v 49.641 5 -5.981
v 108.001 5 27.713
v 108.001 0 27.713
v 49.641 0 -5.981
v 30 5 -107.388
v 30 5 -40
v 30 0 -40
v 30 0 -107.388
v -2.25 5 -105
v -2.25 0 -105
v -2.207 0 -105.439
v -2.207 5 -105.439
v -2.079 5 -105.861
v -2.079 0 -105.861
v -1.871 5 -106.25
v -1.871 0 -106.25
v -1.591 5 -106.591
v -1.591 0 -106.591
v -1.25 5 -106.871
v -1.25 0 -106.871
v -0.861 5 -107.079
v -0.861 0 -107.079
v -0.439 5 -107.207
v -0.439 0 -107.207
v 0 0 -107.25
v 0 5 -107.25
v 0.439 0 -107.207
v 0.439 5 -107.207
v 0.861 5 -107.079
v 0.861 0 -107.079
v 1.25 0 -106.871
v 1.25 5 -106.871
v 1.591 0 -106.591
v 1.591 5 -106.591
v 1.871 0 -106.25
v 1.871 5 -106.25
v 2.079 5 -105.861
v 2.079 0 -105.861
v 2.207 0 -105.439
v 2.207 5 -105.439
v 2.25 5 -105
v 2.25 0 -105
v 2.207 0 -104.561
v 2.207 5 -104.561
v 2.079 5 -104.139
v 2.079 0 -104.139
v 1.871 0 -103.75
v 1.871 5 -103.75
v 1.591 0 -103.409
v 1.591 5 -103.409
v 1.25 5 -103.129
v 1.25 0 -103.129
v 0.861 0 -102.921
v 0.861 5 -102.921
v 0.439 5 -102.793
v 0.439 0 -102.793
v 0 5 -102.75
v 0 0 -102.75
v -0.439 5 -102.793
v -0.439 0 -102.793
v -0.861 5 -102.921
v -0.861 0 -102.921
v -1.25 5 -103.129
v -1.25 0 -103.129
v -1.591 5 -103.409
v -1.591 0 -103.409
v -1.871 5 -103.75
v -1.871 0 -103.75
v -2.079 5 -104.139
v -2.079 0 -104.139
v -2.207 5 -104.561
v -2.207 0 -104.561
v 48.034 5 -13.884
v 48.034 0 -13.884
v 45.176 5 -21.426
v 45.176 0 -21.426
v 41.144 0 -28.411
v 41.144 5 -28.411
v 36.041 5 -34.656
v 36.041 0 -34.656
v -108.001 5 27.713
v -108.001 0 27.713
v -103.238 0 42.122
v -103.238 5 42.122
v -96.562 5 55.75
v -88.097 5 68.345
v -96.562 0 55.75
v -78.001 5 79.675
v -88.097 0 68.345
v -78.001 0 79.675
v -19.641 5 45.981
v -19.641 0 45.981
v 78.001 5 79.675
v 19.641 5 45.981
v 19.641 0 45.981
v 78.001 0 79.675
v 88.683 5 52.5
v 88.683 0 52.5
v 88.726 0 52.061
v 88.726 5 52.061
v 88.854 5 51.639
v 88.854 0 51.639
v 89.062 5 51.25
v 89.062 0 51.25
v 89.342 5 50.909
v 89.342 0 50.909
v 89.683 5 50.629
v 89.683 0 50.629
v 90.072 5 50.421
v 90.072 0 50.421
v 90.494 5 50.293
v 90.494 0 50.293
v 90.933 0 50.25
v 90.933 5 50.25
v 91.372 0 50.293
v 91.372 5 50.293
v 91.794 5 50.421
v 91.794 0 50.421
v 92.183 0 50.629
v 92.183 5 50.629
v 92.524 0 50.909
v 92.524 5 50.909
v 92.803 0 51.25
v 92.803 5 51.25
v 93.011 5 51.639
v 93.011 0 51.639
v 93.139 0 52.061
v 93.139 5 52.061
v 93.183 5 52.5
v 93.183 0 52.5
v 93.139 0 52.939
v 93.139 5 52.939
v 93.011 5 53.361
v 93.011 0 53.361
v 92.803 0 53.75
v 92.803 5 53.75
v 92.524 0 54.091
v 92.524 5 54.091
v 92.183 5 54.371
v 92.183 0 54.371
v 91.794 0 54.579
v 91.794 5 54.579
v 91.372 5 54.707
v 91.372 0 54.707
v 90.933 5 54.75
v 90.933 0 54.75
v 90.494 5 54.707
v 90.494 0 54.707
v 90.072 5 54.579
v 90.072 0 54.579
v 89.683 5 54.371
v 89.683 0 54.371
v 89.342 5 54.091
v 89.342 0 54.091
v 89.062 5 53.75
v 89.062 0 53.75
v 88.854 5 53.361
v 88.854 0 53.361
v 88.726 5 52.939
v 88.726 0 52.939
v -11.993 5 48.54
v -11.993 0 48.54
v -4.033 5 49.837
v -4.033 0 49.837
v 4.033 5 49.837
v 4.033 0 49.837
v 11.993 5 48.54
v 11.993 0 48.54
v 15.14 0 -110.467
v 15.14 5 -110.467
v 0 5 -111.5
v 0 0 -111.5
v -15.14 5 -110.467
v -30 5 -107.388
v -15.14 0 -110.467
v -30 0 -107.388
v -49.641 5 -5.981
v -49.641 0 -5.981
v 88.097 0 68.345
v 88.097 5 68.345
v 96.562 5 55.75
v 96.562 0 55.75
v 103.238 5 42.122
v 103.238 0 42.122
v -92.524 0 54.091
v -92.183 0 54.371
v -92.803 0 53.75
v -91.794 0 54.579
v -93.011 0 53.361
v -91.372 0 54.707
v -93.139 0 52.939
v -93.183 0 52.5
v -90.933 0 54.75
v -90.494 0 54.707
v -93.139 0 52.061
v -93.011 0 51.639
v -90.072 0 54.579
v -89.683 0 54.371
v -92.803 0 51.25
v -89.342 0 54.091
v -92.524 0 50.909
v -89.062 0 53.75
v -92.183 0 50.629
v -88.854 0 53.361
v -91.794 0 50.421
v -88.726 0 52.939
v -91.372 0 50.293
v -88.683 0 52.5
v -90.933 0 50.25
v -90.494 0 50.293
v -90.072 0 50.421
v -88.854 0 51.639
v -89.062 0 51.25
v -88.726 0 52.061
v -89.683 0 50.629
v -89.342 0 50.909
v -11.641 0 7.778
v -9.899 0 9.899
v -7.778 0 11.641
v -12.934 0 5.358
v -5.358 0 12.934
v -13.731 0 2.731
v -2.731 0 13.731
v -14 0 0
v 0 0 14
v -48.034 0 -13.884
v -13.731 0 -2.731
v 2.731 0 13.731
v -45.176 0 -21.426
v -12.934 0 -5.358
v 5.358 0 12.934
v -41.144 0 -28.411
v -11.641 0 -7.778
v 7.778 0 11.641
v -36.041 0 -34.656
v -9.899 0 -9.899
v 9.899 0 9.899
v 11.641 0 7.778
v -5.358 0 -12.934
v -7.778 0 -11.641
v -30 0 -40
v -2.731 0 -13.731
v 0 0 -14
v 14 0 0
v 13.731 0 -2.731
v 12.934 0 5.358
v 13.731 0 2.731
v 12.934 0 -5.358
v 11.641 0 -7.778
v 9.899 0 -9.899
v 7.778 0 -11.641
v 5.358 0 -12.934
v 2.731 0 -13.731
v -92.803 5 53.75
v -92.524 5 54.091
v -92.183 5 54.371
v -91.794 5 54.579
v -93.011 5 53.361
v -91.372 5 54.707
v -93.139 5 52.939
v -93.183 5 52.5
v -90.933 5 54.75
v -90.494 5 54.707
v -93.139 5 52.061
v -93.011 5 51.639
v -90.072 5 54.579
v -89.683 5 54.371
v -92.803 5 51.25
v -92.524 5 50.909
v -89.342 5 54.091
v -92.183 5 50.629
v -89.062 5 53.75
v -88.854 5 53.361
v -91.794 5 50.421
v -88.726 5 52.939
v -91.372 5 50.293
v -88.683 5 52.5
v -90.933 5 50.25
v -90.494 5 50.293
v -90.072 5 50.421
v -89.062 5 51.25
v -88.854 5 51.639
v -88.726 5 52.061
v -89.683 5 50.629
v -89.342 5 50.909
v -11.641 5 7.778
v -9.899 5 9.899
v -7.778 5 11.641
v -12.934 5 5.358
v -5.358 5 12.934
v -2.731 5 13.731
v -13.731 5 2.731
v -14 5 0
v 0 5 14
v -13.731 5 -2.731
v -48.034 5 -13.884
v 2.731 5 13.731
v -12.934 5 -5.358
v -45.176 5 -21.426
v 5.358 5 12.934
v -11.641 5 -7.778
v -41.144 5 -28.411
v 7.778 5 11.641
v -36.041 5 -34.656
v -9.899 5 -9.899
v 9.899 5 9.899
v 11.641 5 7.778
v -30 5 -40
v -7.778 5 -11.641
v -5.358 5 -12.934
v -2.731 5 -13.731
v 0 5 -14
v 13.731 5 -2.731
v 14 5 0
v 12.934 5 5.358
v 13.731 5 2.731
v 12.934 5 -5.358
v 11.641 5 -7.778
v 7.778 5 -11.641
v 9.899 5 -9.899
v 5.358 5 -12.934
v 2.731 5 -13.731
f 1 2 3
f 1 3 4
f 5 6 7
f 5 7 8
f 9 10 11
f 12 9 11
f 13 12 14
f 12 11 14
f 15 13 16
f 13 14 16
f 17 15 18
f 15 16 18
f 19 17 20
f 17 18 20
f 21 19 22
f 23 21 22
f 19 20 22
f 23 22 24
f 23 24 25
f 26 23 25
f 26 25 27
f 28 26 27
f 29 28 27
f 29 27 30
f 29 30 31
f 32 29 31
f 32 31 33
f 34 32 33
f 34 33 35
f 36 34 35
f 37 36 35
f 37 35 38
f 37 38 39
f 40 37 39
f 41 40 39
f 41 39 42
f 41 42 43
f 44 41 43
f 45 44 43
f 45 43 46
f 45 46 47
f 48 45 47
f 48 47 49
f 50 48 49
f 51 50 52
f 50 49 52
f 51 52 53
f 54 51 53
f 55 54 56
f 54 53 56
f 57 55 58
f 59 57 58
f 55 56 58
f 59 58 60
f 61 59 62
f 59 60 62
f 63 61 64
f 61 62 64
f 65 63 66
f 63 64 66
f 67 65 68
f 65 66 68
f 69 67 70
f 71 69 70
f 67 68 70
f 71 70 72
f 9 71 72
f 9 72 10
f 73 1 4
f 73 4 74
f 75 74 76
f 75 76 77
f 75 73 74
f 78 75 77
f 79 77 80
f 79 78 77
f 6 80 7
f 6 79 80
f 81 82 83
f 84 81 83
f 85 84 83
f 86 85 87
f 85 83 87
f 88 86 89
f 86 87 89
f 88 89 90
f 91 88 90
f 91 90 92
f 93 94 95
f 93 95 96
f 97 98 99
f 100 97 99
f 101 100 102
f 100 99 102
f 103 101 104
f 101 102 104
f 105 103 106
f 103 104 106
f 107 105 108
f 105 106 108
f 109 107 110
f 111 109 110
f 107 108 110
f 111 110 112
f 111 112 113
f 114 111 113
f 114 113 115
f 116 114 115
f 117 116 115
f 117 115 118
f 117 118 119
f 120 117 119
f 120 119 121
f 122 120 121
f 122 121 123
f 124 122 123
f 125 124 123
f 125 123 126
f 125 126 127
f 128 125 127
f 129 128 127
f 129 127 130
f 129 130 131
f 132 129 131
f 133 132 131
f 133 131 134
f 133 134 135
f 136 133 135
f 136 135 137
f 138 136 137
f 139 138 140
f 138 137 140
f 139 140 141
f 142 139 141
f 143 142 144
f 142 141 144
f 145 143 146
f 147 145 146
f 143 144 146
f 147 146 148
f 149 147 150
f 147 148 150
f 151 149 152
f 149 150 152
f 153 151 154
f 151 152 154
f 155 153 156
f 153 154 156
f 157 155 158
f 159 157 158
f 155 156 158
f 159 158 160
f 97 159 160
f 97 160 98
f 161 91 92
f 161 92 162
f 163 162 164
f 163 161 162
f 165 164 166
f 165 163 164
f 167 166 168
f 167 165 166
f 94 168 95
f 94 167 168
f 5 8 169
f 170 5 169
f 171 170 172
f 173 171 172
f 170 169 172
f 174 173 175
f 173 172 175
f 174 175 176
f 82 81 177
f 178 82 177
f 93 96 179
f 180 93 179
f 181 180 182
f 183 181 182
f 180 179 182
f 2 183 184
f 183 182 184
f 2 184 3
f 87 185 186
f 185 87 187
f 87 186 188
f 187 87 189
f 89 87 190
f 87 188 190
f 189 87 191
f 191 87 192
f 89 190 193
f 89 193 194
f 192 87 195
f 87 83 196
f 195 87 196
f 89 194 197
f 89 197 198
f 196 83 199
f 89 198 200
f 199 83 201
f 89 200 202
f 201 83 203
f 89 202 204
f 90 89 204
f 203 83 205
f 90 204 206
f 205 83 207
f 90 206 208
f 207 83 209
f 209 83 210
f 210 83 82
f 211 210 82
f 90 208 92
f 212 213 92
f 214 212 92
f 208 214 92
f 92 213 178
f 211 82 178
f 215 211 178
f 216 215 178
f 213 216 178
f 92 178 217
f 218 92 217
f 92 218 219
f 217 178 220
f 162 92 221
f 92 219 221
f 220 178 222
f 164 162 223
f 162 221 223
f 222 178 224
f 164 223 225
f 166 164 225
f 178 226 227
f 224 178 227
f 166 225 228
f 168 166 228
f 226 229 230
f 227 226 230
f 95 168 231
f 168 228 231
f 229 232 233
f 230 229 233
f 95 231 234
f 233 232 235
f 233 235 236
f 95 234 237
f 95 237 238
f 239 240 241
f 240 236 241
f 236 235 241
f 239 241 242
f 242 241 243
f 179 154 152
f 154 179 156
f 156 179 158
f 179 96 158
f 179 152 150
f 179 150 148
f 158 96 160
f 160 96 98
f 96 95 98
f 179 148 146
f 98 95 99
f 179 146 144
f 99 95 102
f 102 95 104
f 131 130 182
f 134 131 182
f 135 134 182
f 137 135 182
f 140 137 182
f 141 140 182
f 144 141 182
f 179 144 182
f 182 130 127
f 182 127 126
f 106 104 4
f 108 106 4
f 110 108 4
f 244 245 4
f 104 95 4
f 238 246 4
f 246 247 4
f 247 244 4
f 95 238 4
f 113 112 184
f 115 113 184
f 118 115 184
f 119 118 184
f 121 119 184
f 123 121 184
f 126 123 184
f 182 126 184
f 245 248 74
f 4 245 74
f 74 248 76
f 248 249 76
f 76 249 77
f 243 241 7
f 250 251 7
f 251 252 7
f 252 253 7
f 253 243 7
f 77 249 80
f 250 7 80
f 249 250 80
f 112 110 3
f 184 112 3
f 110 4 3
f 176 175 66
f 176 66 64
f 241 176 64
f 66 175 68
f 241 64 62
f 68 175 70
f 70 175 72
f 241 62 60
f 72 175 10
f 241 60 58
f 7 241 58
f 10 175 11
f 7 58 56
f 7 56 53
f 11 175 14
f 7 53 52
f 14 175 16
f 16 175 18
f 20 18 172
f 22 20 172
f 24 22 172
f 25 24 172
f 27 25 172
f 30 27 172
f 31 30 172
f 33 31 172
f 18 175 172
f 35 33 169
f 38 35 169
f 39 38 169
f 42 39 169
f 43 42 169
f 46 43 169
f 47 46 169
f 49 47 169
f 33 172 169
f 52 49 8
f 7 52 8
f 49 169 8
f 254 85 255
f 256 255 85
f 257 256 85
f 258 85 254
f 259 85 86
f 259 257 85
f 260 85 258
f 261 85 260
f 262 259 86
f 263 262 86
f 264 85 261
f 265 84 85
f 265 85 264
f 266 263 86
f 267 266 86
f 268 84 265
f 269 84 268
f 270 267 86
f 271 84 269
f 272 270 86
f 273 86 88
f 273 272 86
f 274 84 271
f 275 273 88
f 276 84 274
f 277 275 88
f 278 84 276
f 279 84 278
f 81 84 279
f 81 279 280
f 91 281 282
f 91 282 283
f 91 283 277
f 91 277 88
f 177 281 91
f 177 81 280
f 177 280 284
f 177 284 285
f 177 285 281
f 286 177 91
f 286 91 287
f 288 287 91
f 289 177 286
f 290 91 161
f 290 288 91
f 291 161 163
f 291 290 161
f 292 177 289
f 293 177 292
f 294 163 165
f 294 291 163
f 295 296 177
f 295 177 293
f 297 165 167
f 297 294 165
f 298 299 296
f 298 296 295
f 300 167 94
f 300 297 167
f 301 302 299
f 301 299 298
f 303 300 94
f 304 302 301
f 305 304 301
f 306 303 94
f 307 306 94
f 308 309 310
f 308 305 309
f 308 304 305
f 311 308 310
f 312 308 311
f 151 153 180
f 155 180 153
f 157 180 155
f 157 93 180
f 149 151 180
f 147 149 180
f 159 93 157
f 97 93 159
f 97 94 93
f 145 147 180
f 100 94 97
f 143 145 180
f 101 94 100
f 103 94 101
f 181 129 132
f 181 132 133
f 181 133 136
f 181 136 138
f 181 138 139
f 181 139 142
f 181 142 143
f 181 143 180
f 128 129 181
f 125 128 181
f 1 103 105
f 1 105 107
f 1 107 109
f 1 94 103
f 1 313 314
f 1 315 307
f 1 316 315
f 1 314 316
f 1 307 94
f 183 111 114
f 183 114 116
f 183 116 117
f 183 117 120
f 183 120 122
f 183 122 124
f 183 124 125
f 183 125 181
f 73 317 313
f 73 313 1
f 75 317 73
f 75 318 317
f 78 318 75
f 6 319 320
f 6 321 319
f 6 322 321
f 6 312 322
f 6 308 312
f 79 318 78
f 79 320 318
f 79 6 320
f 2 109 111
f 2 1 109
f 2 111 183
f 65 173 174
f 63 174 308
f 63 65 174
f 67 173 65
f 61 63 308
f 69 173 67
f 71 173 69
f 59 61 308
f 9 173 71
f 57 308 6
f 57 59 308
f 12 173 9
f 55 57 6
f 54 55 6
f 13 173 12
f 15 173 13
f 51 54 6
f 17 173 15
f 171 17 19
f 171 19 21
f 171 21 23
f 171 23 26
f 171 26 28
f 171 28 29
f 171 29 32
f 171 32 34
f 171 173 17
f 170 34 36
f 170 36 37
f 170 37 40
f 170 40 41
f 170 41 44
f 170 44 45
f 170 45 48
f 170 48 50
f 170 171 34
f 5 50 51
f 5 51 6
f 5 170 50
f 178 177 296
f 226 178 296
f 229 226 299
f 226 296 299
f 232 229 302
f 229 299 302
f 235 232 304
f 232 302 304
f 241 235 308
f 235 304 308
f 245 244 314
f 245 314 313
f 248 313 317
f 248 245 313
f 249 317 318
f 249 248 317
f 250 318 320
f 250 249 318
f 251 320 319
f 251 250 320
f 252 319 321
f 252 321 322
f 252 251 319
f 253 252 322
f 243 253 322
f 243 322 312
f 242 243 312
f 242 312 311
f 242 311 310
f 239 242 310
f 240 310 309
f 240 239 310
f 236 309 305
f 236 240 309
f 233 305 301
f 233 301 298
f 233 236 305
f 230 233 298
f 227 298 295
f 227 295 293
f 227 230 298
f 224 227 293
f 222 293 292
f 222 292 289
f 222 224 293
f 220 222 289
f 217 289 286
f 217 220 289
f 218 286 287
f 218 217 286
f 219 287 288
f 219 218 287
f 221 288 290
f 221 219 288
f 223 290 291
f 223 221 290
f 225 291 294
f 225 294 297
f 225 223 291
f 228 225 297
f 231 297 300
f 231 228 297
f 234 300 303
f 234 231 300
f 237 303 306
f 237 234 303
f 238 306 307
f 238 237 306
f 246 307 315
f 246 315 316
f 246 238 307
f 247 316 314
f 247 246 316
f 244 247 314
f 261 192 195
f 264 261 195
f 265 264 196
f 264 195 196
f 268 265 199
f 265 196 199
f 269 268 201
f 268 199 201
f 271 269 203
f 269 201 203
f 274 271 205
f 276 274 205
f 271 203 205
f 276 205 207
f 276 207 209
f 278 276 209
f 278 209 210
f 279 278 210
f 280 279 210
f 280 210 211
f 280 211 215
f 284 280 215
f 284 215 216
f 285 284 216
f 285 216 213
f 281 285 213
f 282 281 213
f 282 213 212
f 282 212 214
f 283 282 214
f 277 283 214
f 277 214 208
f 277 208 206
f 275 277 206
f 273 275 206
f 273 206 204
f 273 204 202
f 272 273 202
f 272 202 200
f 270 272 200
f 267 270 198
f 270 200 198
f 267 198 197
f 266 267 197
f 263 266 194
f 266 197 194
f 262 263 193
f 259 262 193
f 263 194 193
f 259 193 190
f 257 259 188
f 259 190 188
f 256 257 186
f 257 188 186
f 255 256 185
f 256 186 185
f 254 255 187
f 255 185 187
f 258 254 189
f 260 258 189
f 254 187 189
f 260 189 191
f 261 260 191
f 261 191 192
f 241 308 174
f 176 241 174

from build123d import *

# Parameters (mm, degrees)
SKETCH2_R            = 111.5
SKETCH2_R_2          = 14
BOSS_EXTRUDE1_DEPTH  = 5
M4_CLEARANCE_HOLE2_D = 4.5
CUT_EXTRUDE1_DEPTH   = 6


with BuildPart() as part:
    # Sketch2 → Boss-Extrude1 (new body)
    with BuildSketch(Plane(origin=(0, 0, 0), x_dir=(1, 0, 0), z_dir=(0, 1, 0))):
        Circle(SKETCH2_R)
        Circle(SKETCH2_R_2, mode=Mode.SUBTRACT)
    extrude(amount=BOSS_EXTRUDE1_DEPTH)

    # M4 Clearance Hole2 (through all)
    with Locations(Plane(origin=(0, 5, 0), x_dir=(1, 0, 0), z_dir=(0, 1, 0))):
        with Locations((-90.932667397, -52.5), (90.932667397, -52.5), (0, 105)):
            Hole(M4_CLEARANCE_HOLE2_D / 2)

    # Sketch8 → Cut-Extrude1 (cut, through all)
    with BuildSketch(Plane(origin=(0, 5, 0), x_dir=(1, 0, 0), z_dir=(0, 1, 0))):
        with BuildLine():
            Line((-30, 40), (-30, 107.388314076))
            ThreePointArc((-30, 107.388314076), (-96.561832522, 55.75), (-108.001008059, -27.713394924))
            Line((-108.001008059, -27.713394924), (-49.641016151, 5.980762114))
            ThreePointArc((-49.641016151, 5.980762114), (-43.301270189, 25), (-30, 40))
        make_face()
        with BuildLine():
            Line((30, 40), (30, 107.388314076))
            ThreePointArc((30, 107.388314076), (96.561832522, 55.75), (108.001008059, -27.713394924))
            Line((108.001008059, -27.713394924), (49.641016151, 5.980762114))
            ThreePointArc((49.641016151, 5.980762114), (43.301270189, 25), (30, 40))
        make_face()
        with BuildLine():
            Line((19.641016151, -45.980762114), (78.001008059, -79.674919151))
            ThreePointArc((78.001008059, -79.674919151), (0, -111.5), (-78.001008059, -79.674919151))
            Line((-78.001008059, -79.674919151), (-19.641016151, -45.980762114))
            ThreePointArc((-19.641016151, -45.980762114), (0, -50), (19.641016151, -45.980762114))
        make_face()
    extrude(amount=-CUT_EXTRUDE1_DEPTH, mode=Mode.SUBTRACT)


solid = part.part
